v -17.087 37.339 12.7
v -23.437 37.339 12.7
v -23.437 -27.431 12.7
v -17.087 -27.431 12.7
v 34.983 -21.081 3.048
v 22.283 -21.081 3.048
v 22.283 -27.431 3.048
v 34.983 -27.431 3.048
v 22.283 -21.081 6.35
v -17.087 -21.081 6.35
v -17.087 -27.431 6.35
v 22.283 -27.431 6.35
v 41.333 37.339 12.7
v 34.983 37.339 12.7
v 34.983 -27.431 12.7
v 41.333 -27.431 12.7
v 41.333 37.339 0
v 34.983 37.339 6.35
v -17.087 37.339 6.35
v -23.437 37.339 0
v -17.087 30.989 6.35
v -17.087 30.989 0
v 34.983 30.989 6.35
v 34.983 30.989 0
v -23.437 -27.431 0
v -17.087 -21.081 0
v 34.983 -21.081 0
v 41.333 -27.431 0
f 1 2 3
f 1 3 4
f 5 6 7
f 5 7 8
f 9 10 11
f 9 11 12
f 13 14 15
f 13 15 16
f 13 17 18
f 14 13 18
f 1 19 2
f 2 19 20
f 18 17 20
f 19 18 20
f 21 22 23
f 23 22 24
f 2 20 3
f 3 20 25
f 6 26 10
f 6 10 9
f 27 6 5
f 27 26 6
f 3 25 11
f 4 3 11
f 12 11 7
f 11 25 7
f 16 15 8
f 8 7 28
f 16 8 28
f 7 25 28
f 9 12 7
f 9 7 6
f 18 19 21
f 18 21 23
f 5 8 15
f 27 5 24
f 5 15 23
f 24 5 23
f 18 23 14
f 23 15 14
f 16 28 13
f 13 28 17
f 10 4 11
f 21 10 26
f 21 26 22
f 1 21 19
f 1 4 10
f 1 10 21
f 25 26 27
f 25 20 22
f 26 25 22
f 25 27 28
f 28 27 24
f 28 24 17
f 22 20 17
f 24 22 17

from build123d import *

# Parameters (mm, degrees)
F0_W     = 52.07
F0_H     = 52.07
F1_DEPTH = 12.7
F2_W     = 52.07
F2_H     = 6.35
F3_DEPTH = 6.35
F4_W     = 12.7
F4_H     = 6.35
F5_DEPTH = 3.302


with BuildPart() as f1:
    # F0 (on Top) → F1 (new body)
    with BuildSketch(Plane.XY):
        Polygon((41.3333964217, 37.3389664483), (-17.0866035783, 37.3389664483), (-23.4366035783, 37.3389664483), (-23.4366035783, -27.4310335517), (41.3333964217, -27.4310335517), align=None)
        with Locations((8.9483964217, 4.9539664483)):
            Rectangle(F0_W, F0_H, mode=Mode.SUBTRACT)
    extrude(amount=F1_DEPTH)

    # F2 (on face) → F3 (cut)
    with BuildSketch(Plane.XY.offset(12.7)):
        with Locations((8.9483964217, 34.1639664483)):
            Rectangle(F2_W, F2_H)
        with Locations((8.9483964217, -24.2560335517)):
            Rectangle(F2_W, F2_H)
    extrude(amount=-F3_DEPTH, mode=Mode.SUBTRACT)

    # F4 (on face) → F5 (cut)
    with BuildSketch(Plane.XY.offset(6.35)):
        with Locations((28.6333964217, -24.2560335517)):
            Rectangle(F4_W, F4_H)
    extrude(amount=-F5_DEPTH, mode=Mode.SUBTRACT)


solid = f1.part
